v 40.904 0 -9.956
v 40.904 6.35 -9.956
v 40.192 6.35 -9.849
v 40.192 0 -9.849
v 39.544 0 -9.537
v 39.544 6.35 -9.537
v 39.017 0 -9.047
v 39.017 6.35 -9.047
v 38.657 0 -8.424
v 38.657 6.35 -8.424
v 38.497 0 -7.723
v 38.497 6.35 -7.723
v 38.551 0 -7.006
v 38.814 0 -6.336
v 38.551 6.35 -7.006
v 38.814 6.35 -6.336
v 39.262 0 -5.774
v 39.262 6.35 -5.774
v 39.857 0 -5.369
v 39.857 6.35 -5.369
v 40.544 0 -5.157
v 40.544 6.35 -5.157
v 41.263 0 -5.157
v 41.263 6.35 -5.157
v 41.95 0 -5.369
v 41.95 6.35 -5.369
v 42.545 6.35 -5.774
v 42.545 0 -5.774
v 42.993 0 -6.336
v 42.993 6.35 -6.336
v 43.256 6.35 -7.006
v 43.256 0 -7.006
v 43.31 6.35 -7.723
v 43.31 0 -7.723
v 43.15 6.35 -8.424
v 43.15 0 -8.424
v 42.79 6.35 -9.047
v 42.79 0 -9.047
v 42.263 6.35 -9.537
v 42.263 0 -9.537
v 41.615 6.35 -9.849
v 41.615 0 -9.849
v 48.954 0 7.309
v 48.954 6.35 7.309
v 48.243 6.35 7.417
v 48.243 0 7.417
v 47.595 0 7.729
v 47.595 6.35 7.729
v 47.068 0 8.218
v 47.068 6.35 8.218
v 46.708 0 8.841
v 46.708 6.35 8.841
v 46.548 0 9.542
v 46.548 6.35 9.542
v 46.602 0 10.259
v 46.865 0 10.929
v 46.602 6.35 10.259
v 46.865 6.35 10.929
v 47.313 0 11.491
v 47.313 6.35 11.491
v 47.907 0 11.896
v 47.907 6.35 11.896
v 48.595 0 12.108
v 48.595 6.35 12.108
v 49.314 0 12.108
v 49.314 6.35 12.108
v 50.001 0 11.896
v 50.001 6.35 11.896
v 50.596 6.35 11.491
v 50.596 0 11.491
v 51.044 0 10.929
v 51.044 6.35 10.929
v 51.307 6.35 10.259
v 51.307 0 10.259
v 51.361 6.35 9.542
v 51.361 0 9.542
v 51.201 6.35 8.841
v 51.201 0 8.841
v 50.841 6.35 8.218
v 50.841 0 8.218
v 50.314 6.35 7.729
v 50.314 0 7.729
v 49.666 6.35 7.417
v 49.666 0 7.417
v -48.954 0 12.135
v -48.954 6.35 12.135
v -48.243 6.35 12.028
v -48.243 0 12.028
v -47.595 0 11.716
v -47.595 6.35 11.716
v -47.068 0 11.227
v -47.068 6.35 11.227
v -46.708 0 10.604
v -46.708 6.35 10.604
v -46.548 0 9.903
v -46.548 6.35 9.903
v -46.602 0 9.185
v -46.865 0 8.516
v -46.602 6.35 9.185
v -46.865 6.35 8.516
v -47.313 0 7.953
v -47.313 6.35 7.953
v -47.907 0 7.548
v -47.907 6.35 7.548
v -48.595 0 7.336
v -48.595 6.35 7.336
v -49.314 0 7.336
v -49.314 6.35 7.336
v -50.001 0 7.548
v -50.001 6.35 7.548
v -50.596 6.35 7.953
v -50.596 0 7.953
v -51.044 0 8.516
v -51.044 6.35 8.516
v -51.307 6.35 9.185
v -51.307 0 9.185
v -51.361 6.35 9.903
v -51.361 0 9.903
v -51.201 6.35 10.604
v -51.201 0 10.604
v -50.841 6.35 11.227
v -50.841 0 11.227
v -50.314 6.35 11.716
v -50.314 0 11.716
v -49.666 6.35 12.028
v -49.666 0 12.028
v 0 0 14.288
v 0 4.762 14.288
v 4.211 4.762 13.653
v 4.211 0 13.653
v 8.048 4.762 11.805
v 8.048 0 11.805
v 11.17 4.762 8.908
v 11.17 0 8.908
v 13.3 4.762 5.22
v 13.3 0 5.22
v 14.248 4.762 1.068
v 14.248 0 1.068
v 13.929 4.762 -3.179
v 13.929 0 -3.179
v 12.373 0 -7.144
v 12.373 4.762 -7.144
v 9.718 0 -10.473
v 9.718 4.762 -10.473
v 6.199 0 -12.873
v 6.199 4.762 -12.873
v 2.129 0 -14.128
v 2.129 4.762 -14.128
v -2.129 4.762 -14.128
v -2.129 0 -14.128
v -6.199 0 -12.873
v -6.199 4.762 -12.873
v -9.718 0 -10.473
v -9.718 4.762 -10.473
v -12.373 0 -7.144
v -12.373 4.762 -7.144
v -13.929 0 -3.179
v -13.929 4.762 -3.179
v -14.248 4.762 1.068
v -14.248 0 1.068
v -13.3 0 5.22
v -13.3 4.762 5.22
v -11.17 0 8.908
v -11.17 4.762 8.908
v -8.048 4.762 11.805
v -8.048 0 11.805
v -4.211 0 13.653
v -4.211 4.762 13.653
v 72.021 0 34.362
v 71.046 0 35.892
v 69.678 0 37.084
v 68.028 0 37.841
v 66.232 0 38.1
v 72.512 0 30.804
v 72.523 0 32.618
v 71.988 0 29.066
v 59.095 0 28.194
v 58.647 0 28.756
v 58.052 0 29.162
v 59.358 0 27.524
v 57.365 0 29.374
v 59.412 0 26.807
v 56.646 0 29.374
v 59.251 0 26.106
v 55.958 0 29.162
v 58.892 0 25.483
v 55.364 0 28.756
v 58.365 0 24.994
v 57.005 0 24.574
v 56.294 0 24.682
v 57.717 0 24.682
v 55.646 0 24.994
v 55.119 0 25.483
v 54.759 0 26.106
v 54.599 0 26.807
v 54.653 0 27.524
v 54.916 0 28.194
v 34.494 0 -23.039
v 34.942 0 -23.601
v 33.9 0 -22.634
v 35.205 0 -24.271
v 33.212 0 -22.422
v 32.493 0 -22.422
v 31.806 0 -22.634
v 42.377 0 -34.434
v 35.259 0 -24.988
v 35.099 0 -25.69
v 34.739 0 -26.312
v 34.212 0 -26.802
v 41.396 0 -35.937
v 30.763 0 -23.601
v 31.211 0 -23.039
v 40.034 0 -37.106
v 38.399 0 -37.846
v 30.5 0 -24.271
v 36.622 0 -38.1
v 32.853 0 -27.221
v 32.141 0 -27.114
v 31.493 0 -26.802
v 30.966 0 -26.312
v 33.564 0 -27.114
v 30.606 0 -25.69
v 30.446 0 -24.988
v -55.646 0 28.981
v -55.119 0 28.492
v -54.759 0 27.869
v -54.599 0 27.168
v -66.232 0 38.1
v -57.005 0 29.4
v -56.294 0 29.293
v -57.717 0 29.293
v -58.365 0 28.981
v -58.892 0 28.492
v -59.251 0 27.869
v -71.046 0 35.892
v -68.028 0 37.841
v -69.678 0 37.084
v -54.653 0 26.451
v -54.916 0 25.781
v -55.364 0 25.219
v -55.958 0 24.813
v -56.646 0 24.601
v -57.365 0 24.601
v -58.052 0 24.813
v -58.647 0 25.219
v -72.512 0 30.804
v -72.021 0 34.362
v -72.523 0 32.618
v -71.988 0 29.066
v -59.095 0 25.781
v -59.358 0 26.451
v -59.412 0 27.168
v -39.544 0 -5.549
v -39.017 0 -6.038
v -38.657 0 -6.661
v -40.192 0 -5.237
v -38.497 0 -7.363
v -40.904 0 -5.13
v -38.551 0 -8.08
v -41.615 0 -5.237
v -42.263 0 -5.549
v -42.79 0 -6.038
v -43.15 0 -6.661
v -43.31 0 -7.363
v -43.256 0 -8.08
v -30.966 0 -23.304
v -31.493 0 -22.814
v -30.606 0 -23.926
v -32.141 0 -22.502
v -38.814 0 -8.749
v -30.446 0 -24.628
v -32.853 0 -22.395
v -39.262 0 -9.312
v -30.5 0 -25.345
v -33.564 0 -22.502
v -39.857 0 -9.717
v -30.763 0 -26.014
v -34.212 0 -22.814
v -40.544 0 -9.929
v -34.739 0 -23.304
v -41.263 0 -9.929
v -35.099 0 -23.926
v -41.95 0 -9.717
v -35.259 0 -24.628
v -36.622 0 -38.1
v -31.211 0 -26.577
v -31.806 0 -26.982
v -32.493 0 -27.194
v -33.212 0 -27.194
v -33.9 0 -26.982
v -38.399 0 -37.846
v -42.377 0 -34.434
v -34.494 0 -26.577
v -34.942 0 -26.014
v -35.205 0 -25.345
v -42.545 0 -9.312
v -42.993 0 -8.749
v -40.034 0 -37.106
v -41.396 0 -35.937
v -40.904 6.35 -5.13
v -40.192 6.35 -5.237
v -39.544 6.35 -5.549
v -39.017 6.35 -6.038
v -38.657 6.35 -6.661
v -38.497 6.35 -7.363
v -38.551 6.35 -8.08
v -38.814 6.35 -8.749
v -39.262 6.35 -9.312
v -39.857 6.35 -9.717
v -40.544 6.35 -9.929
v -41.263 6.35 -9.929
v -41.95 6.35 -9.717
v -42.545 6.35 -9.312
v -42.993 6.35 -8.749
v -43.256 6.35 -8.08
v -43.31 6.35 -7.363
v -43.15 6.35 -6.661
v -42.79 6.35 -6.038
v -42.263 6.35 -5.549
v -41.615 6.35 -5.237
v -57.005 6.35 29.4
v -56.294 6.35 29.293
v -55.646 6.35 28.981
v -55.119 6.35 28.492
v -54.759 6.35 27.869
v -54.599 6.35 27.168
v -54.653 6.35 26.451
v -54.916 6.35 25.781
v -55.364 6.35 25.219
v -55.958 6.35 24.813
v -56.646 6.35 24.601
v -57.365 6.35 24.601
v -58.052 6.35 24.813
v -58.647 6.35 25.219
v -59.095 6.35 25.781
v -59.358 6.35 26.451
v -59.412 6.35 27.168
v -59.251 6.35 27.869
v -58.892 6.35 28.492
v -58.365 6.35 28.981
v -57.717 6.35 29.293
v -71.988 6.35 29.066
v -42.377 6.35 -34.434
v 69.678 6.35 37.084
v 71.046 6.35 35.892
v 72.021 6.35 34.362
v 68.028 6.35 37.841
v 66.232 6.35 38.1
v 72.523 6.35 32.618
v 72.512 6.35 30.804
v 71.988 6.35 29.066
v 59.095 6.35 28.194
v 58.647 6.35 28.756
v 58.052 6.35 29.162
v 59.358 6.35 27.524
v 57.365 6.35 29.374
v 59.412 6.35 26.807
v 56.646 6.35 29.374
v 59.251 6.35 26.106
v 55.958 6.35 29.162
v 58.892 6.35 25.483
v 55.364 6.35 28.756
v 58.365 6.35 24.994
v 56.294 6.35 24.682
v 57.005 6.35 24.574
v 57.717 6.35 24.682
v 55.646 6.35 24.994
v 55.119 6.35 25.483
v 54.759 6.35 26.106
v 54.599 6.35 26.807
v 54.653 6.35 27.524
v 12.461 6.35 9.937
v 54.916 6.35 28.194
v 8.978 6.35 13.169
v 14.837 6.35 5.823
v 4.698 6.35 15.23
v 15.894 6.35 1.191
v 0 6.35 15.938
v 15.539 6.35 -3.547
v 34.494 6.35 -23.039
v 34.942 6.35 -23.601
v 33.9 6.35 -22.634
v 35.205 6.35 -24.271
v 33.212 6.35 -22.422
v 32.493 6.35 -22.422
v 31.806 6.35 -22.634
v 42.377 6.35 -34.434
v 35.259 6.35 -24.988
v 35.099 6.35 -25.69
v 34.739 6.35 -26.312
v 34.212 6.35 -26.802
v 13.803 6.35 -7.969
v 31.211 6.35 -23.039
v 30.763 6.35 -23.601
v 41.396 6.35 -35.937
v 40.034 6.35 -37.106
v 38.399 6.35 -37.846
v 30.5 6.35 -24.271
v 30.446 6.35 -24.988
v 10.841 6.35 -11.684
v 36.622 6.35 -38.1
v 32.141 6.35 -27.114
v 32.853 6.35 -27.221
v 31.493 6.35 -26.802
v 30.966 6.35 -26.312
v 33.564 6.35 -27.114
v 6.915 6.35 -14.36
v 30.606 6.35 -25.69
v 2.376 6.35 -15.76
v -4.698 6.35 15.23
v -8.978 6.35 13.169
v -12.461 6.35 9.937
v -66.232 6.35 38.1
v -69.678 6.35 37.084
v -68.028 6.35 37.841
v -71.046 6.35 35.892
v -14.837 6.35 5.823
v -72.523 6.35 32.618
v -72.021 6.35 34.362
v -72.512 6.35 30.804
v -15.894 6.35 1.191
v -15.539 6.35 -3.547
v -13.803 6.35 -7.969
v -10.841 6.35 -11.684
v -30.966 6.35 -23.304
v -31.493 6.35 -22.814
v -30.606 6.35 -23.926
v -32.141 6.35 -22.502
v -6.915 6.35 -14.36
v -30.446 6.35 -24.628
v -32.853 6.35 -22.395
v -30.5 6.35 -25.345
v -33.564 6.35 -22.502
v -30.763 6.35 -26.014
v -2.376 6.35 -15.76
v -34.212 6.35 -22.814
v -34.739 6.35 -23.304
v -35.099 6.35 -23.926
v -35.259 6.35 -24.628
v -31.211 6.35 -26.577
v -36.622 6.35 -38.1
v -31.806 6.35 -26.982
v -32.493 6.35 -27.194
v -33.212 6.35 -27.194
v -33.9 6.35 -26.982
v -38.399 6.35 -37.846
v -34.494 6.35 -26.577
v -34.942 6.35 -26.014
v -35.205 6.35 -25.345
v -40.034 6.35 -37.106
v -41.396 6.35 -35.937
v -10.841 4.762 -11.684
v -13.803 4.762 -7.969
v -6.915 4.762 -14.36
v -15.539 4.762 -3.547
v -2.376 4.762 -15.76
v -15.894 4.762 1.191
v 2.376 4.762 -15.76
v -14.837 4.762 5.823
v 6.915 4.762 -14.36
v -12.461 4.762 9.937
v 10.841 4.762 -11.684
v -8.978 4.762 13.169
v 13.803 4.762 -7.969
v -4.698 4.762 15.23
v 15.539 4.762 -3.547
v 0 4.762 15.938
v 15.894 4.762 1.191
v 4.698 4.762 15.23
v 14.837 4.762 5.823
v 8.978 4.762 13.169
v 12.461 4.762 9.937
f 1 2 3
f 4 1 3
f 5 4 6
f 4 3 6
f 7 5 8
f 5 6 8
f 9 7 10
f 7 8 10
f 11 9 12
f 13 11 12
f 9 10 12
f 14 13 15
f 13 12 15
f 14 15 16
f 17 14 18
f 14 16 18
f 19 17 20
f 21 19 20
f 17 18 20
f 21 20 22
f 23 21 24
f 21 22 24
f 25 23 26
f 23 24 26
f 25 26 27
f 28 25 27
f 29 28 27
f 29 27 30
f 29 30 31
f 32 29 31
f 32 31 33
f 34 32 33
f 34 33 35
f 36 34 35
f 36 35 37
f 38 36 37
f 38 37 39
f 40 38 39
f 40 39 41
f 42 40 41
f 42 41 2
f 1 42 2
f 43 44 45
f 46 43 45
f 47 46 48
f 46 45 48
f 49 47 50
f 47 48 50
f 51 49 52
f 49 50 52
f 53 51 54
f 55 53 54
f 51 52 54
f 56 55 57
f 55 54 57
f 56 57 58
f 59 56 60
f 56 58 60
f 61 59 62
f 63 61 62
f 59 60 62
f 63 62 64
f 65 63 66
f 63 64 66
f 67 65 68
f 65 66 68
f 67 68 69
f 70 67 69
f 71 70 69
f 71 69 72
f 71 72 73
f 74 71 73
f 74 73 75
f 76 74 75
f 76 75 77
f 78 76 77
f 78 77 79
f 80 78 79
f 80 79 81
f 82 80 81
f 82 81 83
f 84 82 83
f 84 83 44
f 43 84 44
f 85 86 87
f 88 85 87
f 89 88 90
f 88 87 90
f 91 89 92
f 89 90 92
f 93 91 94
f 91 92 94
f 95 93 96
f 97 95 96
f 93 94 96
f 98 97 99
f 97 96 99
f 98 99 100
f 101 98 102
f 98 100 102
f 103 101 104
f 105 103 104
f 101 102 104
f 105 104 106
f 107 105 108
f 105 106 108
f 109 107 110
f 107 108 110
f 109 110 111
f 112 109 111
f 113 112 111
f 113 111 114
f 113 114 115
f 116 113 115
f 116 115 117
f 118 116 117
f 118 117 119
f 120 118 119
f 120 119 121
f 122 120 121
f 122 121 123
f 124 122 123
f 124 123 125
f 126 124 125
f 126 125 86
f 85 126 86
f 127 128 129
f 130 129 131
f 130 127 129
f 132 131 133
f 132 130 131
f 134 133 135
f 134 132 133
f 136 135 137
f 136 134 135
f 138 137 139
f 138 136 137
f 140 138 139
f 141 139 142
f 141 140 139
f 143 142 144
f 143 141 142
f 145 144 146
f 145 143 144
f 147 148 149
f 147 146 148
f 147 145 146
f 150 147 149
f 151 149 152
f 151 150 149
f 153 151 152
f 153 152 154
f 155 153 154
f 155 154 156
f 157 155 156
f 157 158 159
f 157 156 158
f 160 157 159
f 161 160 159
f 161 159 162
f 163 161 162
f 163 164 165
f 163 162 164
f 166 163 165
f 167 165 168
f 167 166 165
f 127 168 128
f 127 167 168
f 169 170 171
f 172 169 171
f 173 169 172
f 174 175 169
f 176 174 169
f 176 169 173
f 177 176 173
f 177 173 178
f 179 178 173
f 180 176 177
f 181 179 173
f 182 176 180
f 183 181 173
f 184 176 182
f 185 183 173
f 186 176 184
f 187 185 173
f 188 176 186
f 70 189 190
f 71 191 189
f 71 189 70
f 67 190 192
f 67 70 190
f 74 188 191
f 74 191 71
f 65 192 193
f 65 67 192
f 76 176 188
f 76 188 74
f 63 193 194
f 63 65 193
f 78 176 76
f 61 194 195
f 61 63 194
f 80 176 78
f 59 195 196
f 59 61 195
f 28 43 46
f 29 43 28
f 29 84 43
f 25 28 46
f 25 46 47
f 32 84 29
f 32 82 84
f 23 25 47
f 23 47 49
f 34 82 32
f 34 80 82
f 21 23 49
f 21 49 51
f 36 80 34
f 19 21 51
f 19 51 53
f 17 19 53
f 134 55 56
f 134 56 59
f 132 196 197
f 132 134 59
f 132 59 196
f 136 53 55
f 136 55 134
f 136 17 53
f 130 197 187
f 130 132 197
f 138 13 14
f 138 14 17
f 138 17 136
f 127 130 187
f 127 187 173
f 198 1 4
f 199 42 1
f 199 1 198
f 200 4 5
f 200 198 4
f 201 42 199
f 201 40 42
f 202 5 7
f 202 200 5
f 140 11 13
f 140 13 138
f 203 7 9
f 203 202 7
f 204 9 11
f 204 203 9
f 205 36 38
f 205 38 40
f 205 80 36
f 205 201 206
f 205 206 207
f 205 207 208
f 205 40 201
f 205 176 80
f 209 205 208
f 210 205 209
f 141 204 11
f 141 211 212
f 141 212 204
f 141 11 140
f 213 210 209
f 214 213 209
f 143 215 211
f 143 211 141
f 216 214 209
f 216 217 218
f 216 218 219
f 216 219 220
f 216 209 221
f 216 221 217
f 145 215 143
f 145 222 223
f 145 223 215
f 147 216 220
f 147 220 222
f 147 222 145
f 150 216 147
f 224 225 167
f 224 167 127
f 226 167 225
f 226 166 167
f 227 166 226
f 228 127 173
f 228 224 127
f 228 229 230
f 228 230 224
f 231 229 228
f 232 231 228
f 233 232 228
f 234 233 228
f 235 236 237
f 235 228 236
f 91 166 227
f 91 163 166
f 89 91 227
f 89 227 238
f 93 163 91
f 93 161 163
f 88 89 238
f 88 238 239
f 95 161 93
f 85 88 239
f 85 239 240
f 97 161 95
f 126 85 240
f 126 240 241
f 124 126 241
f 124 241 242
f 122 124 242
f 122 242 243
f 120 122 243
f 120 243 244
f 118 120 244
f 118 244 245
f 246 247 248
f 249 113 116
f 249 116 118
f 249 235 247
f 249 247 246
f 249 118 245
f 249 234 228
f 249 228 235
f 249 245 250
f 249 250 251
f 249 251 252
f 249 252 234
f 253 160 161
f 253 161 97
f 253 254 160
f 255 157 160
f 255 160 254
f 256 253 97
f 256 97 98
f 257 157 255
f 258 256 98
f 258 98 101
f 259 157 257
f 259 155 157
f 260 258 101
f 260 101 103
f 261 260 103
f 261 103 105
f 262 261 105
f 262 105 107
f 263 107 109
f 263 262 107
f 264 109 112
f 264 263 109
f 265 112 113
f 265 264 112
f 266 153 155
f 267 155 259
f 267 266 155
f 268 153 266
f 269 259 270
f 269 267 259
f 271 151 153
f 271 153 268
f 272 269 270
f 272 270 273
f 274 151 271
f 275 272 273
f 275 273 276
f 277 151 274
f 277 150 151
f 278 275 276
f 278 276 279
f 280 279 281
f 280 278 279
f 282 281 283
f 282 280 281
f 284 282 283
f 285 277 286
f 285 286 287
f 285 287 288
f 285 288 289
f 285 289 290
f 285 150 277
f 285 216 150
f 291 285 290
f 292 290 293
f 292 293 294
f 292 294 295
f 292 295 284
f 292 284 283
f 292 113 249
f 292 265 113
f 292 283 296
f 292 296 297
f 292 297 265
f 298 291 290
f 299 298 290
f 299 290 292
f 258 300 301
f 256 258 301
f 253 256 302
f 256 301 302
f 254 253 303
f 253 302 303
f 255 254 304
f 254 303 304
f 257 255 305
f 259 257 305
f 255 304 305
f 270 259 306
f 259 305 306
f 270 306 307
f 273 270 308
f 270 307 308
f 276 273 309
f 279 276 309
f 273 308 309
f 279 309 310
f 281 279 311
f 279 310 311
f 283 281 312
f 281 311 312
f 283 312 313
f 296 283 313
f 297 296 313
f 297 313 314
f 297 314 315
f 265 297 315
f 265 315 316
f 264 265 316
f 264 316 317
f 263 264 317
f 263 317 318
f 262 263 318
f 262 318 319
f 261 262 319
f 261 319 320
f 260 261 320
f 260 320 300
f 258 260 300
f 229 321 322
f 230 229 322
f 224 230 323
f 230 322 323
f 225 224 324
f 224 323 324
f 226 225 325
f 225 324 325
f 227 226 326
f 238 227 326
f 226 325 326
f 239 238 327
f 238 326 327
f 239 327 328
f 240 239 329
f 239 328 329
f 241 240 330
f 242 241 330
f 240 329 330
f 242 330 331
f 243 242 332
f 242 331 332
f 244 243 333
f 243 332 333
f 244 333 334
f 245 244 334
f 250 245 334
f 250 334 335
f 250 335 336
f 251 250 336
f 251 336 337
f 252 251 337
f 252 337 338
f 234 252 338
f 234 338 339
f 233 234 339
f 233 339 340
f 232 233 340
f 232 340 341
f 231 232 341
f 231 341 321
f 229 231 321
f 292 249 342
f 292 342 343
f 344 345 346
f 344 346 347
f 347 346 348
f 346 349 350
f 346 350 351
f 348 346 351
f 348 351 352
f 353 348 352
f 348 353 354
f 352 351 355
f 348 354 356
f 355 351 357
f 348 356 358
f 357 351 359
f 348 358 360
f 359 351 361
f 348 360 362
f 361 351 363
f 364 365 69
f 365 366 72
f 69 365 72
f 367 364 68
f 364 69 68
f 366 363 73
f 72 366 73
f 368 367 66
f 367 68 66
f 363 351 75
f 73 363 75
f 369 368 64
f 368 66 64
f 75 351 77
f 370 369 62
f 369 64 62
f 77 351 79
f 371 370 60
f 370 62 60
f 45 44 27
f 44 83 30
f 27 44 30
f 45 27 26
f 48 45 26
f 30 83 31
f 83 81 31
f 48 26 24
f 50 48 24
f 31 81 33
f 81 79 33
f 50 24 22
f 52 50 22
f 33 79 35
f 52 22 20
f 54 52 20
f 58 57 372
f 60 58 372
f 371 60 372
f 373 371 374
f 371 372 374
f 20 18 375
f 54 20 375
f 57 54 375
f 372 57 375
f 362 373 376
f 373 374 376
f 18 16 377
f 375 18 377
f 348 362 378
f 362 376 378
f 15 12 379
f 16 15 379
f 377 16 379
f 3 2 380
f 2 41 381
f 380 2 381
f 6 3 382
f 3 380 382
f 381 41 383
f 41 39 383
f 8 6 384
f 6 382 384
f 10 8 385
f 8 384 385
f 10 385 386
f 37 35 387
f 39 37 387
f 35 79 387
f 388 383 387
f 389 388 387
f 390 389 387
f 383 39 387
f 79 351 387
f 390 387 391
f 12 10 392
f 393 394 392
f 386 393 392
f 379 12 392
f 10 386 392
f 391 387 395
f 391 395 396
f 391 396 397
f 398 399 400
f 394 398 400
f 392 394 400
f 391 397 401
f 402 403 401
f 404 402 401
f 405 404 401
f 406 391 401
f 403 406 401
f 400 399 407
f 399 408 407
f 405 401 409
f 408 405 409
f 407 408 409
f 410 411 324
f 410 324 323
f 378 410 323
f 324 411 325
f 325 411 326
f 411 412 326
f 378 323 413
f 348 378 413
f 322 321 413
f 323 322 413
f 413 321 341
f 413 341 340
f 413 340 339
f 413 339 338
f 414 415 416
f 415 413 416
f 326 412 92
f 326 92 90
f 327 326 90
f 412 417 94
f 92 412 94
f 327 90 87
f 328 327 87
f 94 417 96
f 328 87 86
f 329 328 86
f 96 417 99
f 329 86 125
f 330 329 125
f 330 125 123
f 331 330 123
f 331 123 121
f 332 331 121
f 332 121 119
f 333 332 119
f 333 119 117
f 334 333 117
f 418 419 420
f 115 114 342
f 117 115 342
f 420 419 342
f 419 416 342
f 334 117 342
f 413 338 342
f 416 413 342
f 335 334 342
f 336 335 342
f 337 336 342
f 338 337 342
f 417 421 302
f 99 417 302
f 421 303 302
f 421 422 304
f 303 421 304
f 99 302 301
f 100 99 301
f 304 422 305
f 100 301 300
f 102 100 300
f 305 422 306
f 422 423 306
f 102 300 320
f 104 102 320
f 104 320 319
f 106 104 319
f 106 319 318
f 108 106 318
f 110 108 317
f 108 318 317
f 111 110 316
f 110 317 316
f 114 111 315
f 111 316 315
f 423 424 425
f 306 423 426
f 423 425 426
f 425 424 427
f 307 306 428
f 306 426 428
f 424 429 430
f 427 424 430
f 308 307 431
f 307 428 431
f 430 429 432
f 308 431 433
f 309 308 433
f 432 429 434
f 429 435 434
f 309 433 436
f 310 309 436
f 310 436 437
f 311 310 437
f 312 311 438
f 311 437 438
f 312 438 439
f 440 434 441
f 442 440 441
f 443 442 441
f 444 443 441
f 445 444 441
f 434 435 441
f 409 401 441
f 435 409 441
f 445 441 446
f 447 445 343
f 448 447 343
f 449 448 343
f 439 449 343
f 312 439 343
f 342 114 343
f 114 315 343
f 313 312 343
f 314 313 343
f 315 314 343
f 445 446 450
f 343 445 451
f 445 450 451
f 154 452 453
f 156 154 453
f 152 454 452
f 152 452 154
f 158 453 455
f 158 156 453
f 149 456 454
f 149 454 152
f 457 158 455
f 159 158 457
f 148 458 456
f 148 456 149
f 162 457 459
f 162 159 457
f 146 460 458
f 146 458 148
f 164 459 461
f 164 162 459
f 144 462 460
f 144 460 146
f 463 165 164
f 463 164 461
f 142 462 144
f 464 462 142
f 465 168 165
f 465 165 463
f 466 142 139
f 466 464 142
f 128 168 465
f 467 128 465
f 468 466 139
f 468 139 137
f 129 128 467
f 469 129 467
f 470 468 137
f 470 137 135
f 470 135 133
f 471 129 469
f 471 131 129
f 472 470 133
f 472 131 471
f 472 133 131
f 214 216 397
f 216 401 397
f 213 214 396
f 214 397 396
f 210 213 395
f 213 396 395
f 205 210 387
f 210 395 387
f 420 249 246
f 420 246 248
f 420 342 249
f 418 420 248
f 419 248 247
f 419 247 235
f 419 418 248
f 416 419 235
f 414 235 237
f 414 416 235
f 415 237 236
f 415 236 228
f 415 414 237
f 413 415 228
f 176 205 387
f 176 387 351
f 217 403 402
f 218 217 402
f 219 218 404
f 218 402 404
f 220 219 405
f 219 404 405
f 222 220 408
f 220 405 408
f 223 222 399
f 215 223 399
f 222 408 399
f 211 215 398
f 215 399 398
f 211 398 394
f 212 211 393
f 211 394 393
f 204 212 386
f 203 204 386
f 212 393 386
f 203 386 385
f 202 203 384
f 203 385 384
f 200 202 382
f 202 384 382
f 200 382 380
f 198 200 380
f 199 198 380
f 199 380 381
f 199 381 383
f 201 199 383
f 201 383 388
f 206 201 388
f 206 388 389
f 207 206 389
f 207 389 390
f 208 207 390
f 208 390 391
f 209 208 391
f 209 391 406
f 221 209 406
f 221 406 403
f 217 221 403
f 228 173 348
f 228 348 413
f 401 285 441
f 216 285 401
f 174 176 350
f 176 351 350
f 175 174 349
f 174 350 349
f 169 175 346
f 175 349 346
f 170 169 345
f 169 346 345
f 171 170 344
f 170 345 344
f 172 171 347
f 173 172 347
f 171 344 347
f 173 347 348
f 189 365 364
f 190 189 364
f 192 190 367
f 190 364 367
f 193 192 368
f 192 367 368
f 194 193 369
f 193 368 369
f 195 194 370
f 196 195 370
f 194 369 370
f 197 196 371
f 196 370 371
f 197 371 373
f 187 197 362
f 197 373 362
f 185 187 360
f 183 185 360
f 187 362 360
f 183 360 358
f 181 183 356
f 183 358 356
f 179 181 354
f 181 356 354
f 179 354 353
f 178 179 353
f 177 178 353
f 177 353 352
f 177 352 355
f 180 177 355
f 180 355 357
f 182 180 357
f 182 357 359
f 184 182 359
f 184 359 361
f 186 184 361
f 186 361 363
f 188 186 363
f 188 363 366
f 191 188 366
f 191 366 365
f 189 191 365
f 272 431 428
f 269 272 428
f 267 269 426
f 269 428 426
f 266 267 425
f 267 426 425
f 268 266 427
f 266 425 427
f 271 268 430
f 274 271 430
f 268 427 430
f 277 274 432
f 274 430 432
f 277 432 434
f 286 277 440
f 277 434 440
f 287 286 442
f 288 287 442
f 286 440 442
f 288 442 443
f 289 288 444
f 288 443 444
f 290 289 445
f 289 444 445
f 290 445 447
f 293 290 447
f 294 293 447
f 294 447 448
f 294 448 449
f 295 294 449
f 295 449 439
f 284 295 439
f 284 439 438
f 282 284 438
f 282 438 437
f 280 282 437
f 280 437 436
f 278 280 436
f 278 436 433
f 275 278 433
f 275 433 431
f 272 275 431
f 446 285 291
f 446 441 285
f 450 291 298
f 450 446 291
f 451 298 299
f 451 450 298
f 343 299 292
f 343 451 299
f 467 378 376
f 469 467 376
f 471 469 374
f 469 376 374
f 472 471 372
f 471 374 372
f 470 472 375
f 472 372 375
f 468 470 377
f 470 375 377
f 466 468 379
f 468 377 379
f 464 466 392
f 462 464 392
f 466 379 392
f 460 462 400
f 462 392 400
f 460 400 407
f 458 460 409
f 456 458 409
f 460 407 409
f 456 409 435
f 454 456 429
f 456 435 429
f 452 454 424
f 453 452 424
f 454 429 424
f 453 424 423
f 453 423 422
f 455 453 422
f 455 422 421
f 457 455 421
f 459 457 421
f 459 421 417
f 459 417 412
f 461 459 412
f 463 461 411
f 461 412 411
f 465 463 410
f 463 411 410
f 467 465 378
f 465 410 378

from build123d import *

# Parameters (mm, degrees)
SKETCH1_R           = 14.2875
BOSS_EXTRUDE1_DEPTH = 6.35
SKETCH2_R           = 2.413
CUT_EXTRUDE1_DEPTH  = 86.430512699
FILLET1_R           = 6.35
SKETCH3_R           = 15.9385
CUT_EXTRUDE2_DEPTH  = 1.5875


with BuildPart() as part:
    # Sketch1 → Boss-Extrude1 (new body)
    with BuildSketch(Plane(origin=(0, 0, 0), x_dir=(1, 0, 0), z_dir=(0, 1, 0))):
        Polygon((-40.667356449, 38.1), (40.667356449, 38.1), (76.2, -38.1), (-76.2, -38.1), align=None)
        with Locations(Location((0, 0, 0), (0, 0, 270))):
            Circle(SKETCH1_R, mode=Mode.SUBTRACT)
    extrude(amount=BOSS_EXTRUDE1_DEPTH)

    # Sketch2 → Cut-Extrude1 (cut, through all)
    with BuildSketch(Plane(origin=(0, 6.35, 0), x_dir=(1, 0, 0), z_dir=(0, 1, 0))):
        with Locations(Location((-57.005256578, -26.9875, 0), (0, 0, 270))):
            Circle(SKETCH2_R)
        with Locations(Location((-48.954378692, -9.722336657, 0), (0, 0, 270))):
            Circle(SKETCH2_R)
        with Locations(Location((-40.903500806, 7.542826686, 0), (0, 0, 270))):
            Circle(SKETCH2_R)
        with Locations(Location((-32.852622919, 24.807990029, 0), (0, 0, 270))):
            Circle(SKETCH2_R)
        with Locations(Location((32.852622919, 24.807990029, 0), (0, 0, 90))):
            Circle(SKETCH2_R)
        with Locations(Location((40.903500806, 7.542826686, 0), (0, 0, 90))):
            Circle(SKETCH2_R)
        with Locations(Location((48.954378692, -9.722336657, 0), (0, 0, 90))):
            Circle(SKETCH2_R)
        with Locations(Location((57.005256578, -26.9875, 0), (0, 0, 90))):
            Circle(SKETCH2_R)
    extrude(amount=-CUT_EXTRUDE1_DEPTH, mode=Mode.SUBTRACT)

    # Fillet1
    fillet1_edges = [part.edges().sort_by_distance(p)[0] for p in [
        (-40.667356449, 3.175, -38.1),
        (40.667356449, 3.175, -38.1),
        (76.2, 3.175, 38.1),
        (-76.2, 3.175, 38.1),
    ]]
    fillet(fillet1_edges, radius=FILLET1_R)

    # Sketch3 → Cut-Extrude2 (cut)
    with BuildSketch(Plane(origin=(0, 6.35, 0), x_dir=(1, 0, 0), z_dir=(0, 1, 0))):
        with Locations(Location((0, 0, 0), (0, 0, 270))):
            Circle(SKETCH3_R)
    extrude(amount=-CUT_EXTRUDE2_DEPTH, mode=Mode.SUBTRACT)


solid = part.part
